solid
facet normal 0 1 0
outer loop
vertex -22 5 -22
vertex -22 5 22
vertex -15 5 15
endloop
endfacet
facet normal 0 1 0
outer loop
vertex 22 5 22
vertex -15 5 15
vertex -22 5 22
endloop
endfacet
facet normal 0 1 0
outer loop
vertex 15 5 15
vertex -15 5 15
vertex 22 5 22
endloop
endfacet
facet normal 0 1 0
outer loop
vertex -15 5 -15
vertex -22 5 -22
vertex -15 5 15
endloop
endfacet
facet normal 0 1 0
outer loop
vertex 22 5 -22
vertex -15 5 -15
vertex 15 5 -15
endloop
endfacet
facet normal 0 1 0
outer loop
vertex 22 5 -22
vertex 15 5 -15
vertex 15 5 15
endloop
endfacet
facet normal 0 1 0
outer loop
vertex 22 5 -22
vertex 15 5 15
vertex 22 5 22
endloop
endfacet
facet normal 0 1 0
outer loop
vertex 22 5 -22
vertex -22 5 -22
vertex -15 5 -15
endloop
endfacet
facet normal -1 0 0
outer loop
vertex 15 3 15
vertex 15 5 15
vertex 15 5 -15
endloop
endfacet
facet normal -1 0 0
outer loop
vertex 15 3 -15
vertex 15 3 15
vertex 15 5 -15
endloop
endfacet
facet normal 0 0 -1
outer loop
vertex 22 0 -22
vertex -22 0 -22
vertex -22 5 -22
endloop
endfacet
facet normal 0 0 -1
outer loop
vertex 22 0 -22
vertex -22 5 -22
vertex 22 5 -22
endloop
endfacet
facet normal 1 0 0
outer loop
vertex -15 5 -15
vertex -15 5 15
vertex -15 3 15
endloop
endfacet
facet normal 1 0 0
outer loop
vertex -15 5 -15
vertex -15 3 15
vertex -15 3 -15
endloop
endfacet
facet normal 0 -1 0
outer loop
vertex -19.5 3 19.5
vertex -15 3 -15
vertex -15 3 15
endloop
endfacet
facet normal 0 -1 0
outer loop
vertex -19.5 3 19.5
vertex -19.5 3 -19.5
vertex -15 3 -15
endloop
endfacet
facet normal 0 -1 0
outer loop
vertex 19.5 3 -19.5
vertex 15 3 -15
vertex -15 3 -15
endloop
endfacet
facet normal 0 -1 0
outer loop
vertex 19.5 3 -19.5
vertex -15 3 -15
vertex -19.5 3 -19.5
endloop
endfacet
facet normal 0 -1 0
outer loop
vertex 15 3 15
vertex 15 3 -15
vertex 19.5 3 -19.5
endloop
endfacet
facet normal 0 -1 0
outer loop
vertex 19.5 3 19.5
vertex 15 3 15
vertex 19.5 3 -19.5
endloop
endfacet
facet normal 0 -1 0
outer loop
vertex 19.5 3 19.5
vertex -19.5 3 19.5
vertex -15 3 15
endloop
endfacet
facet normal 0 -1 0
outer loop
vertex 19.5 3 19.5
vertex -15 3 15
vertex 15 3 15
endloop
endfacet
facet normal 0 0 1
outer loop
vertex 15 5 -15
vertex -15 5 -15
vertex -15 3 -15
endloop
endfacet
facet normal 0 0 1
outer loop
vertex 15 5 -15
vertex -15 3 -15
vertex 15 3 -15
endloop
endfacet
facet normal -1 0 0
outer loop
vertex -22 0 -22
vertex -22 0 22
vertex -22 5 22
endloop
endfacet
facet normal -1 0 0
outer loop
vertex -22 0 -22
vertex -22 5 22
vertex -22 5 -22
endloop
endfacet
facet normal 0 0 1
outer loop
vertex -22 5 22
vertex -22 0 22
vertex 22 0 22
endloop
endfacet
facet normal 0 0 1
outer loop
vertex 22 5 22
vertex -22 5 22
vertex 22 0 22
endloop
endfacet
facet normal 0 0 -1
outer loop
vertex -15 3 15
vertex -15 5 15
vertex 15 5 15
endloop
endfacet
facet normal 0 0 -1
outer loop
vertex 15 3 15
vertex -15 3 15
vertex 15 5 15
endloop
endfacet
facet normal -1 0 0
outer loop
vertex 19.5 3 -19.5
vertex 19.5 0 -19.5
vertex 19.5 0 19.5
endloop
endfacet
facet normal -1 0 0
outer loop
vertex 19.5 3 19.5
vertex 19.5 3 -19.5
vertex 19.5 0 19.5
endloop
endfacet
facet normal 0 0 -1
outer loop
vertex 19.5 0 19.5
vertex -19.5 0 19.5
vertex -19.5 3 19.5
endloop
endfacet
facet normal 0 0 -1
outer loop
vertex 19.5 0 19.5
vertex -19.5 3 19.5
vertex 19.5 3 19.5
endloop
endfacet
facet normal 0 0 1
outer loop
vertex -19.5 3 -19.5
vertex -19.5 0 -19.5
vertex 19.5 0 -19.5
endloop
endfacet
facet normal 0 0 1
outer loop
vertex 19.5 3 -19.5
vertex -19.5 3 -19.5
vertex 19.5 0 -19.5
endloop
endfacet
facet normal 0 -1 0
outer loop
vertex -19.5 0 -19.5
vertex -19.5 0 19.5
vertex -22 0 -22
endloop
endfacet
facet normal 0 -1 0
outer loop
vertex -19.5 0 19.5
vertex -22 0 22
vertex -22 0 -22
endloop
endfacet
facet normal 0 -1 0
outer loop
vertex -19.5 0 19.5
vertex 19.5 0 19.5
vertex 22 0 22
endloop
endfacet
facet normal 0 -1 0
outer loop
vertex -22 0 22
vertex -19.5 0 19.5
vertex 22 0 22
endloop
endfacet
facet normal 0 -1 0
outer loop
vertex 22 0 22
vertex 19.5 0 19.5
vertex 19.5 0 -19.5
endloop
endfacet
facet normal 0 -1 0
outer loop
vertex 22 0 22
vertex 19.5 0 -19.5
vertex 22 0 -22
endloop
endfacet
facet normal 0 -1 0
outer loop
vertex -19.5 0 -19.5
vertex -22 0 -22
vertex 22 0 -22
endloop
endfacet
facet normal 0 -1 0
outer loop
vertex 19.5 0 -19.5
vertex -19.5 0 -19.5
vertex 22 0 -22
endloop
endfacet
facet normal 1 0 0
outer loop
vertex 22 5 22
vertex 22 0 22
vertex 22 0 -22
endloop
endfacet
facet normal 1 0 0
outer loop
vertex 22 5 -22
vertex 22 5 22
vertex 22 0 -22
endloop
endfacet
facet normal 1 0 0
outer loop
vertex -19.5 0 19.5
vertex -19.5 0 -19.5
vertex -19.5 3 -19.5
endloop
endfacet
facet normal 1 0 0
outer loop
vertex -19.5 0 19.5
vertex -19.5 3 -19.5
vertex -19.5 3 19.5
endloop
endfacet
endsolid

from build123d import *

# Parameters (mm, degrees)
SKETCH1_W           = 44
SKETCH1_H           = 44
BOSS_EXTRUDE1_DEPTH = 5
SKETCH3_W           = 30
SKETCH3_H           = 30
CUT_EXTRUDE1_DEPTH  = 2
SKETCH5_W           = 39
SKETCH5_H           = 39
CUT_EXTRUDE3_DEPTH  = 3


with BuildPart() as part:
    # Sketch1 → Boss-Extrude1 (new body)
    with BuildSketch(Plane(origin=(0, 0, 0), x_dir=(1, 0, 0), z_dir=(0, 1, 0))):
        Rectangle(SKETCH1_W, SKETCH1_H)
    extrude(amount=BOSS_EXTRUDE1_DEPTH)

    # Sketch3 → Cut-Extrude1 (cut)
    with BuildSketch(Plane(origin=(0, 5, 0), x_dir=(1, 0, 0), z_dir=(0, 1, 0))):
        Rectangle(SKETCH3_W, SKETCH3_H)
    extrude(amount=-CUT_EXTRUDE1_DEPTH, mode=Mode.SUBTRACT)

    # Sketch5 → Cut-Extrude3 (cut)
    with BuildSketch(Plane.XZ):
        Rectangle(SKETCH5_W, SKETCH5_H)
    extrude(amount=-CUT_EXTRUDE3_DEPTH, mode=Mode.SUBTRACT)


solid = part.part
